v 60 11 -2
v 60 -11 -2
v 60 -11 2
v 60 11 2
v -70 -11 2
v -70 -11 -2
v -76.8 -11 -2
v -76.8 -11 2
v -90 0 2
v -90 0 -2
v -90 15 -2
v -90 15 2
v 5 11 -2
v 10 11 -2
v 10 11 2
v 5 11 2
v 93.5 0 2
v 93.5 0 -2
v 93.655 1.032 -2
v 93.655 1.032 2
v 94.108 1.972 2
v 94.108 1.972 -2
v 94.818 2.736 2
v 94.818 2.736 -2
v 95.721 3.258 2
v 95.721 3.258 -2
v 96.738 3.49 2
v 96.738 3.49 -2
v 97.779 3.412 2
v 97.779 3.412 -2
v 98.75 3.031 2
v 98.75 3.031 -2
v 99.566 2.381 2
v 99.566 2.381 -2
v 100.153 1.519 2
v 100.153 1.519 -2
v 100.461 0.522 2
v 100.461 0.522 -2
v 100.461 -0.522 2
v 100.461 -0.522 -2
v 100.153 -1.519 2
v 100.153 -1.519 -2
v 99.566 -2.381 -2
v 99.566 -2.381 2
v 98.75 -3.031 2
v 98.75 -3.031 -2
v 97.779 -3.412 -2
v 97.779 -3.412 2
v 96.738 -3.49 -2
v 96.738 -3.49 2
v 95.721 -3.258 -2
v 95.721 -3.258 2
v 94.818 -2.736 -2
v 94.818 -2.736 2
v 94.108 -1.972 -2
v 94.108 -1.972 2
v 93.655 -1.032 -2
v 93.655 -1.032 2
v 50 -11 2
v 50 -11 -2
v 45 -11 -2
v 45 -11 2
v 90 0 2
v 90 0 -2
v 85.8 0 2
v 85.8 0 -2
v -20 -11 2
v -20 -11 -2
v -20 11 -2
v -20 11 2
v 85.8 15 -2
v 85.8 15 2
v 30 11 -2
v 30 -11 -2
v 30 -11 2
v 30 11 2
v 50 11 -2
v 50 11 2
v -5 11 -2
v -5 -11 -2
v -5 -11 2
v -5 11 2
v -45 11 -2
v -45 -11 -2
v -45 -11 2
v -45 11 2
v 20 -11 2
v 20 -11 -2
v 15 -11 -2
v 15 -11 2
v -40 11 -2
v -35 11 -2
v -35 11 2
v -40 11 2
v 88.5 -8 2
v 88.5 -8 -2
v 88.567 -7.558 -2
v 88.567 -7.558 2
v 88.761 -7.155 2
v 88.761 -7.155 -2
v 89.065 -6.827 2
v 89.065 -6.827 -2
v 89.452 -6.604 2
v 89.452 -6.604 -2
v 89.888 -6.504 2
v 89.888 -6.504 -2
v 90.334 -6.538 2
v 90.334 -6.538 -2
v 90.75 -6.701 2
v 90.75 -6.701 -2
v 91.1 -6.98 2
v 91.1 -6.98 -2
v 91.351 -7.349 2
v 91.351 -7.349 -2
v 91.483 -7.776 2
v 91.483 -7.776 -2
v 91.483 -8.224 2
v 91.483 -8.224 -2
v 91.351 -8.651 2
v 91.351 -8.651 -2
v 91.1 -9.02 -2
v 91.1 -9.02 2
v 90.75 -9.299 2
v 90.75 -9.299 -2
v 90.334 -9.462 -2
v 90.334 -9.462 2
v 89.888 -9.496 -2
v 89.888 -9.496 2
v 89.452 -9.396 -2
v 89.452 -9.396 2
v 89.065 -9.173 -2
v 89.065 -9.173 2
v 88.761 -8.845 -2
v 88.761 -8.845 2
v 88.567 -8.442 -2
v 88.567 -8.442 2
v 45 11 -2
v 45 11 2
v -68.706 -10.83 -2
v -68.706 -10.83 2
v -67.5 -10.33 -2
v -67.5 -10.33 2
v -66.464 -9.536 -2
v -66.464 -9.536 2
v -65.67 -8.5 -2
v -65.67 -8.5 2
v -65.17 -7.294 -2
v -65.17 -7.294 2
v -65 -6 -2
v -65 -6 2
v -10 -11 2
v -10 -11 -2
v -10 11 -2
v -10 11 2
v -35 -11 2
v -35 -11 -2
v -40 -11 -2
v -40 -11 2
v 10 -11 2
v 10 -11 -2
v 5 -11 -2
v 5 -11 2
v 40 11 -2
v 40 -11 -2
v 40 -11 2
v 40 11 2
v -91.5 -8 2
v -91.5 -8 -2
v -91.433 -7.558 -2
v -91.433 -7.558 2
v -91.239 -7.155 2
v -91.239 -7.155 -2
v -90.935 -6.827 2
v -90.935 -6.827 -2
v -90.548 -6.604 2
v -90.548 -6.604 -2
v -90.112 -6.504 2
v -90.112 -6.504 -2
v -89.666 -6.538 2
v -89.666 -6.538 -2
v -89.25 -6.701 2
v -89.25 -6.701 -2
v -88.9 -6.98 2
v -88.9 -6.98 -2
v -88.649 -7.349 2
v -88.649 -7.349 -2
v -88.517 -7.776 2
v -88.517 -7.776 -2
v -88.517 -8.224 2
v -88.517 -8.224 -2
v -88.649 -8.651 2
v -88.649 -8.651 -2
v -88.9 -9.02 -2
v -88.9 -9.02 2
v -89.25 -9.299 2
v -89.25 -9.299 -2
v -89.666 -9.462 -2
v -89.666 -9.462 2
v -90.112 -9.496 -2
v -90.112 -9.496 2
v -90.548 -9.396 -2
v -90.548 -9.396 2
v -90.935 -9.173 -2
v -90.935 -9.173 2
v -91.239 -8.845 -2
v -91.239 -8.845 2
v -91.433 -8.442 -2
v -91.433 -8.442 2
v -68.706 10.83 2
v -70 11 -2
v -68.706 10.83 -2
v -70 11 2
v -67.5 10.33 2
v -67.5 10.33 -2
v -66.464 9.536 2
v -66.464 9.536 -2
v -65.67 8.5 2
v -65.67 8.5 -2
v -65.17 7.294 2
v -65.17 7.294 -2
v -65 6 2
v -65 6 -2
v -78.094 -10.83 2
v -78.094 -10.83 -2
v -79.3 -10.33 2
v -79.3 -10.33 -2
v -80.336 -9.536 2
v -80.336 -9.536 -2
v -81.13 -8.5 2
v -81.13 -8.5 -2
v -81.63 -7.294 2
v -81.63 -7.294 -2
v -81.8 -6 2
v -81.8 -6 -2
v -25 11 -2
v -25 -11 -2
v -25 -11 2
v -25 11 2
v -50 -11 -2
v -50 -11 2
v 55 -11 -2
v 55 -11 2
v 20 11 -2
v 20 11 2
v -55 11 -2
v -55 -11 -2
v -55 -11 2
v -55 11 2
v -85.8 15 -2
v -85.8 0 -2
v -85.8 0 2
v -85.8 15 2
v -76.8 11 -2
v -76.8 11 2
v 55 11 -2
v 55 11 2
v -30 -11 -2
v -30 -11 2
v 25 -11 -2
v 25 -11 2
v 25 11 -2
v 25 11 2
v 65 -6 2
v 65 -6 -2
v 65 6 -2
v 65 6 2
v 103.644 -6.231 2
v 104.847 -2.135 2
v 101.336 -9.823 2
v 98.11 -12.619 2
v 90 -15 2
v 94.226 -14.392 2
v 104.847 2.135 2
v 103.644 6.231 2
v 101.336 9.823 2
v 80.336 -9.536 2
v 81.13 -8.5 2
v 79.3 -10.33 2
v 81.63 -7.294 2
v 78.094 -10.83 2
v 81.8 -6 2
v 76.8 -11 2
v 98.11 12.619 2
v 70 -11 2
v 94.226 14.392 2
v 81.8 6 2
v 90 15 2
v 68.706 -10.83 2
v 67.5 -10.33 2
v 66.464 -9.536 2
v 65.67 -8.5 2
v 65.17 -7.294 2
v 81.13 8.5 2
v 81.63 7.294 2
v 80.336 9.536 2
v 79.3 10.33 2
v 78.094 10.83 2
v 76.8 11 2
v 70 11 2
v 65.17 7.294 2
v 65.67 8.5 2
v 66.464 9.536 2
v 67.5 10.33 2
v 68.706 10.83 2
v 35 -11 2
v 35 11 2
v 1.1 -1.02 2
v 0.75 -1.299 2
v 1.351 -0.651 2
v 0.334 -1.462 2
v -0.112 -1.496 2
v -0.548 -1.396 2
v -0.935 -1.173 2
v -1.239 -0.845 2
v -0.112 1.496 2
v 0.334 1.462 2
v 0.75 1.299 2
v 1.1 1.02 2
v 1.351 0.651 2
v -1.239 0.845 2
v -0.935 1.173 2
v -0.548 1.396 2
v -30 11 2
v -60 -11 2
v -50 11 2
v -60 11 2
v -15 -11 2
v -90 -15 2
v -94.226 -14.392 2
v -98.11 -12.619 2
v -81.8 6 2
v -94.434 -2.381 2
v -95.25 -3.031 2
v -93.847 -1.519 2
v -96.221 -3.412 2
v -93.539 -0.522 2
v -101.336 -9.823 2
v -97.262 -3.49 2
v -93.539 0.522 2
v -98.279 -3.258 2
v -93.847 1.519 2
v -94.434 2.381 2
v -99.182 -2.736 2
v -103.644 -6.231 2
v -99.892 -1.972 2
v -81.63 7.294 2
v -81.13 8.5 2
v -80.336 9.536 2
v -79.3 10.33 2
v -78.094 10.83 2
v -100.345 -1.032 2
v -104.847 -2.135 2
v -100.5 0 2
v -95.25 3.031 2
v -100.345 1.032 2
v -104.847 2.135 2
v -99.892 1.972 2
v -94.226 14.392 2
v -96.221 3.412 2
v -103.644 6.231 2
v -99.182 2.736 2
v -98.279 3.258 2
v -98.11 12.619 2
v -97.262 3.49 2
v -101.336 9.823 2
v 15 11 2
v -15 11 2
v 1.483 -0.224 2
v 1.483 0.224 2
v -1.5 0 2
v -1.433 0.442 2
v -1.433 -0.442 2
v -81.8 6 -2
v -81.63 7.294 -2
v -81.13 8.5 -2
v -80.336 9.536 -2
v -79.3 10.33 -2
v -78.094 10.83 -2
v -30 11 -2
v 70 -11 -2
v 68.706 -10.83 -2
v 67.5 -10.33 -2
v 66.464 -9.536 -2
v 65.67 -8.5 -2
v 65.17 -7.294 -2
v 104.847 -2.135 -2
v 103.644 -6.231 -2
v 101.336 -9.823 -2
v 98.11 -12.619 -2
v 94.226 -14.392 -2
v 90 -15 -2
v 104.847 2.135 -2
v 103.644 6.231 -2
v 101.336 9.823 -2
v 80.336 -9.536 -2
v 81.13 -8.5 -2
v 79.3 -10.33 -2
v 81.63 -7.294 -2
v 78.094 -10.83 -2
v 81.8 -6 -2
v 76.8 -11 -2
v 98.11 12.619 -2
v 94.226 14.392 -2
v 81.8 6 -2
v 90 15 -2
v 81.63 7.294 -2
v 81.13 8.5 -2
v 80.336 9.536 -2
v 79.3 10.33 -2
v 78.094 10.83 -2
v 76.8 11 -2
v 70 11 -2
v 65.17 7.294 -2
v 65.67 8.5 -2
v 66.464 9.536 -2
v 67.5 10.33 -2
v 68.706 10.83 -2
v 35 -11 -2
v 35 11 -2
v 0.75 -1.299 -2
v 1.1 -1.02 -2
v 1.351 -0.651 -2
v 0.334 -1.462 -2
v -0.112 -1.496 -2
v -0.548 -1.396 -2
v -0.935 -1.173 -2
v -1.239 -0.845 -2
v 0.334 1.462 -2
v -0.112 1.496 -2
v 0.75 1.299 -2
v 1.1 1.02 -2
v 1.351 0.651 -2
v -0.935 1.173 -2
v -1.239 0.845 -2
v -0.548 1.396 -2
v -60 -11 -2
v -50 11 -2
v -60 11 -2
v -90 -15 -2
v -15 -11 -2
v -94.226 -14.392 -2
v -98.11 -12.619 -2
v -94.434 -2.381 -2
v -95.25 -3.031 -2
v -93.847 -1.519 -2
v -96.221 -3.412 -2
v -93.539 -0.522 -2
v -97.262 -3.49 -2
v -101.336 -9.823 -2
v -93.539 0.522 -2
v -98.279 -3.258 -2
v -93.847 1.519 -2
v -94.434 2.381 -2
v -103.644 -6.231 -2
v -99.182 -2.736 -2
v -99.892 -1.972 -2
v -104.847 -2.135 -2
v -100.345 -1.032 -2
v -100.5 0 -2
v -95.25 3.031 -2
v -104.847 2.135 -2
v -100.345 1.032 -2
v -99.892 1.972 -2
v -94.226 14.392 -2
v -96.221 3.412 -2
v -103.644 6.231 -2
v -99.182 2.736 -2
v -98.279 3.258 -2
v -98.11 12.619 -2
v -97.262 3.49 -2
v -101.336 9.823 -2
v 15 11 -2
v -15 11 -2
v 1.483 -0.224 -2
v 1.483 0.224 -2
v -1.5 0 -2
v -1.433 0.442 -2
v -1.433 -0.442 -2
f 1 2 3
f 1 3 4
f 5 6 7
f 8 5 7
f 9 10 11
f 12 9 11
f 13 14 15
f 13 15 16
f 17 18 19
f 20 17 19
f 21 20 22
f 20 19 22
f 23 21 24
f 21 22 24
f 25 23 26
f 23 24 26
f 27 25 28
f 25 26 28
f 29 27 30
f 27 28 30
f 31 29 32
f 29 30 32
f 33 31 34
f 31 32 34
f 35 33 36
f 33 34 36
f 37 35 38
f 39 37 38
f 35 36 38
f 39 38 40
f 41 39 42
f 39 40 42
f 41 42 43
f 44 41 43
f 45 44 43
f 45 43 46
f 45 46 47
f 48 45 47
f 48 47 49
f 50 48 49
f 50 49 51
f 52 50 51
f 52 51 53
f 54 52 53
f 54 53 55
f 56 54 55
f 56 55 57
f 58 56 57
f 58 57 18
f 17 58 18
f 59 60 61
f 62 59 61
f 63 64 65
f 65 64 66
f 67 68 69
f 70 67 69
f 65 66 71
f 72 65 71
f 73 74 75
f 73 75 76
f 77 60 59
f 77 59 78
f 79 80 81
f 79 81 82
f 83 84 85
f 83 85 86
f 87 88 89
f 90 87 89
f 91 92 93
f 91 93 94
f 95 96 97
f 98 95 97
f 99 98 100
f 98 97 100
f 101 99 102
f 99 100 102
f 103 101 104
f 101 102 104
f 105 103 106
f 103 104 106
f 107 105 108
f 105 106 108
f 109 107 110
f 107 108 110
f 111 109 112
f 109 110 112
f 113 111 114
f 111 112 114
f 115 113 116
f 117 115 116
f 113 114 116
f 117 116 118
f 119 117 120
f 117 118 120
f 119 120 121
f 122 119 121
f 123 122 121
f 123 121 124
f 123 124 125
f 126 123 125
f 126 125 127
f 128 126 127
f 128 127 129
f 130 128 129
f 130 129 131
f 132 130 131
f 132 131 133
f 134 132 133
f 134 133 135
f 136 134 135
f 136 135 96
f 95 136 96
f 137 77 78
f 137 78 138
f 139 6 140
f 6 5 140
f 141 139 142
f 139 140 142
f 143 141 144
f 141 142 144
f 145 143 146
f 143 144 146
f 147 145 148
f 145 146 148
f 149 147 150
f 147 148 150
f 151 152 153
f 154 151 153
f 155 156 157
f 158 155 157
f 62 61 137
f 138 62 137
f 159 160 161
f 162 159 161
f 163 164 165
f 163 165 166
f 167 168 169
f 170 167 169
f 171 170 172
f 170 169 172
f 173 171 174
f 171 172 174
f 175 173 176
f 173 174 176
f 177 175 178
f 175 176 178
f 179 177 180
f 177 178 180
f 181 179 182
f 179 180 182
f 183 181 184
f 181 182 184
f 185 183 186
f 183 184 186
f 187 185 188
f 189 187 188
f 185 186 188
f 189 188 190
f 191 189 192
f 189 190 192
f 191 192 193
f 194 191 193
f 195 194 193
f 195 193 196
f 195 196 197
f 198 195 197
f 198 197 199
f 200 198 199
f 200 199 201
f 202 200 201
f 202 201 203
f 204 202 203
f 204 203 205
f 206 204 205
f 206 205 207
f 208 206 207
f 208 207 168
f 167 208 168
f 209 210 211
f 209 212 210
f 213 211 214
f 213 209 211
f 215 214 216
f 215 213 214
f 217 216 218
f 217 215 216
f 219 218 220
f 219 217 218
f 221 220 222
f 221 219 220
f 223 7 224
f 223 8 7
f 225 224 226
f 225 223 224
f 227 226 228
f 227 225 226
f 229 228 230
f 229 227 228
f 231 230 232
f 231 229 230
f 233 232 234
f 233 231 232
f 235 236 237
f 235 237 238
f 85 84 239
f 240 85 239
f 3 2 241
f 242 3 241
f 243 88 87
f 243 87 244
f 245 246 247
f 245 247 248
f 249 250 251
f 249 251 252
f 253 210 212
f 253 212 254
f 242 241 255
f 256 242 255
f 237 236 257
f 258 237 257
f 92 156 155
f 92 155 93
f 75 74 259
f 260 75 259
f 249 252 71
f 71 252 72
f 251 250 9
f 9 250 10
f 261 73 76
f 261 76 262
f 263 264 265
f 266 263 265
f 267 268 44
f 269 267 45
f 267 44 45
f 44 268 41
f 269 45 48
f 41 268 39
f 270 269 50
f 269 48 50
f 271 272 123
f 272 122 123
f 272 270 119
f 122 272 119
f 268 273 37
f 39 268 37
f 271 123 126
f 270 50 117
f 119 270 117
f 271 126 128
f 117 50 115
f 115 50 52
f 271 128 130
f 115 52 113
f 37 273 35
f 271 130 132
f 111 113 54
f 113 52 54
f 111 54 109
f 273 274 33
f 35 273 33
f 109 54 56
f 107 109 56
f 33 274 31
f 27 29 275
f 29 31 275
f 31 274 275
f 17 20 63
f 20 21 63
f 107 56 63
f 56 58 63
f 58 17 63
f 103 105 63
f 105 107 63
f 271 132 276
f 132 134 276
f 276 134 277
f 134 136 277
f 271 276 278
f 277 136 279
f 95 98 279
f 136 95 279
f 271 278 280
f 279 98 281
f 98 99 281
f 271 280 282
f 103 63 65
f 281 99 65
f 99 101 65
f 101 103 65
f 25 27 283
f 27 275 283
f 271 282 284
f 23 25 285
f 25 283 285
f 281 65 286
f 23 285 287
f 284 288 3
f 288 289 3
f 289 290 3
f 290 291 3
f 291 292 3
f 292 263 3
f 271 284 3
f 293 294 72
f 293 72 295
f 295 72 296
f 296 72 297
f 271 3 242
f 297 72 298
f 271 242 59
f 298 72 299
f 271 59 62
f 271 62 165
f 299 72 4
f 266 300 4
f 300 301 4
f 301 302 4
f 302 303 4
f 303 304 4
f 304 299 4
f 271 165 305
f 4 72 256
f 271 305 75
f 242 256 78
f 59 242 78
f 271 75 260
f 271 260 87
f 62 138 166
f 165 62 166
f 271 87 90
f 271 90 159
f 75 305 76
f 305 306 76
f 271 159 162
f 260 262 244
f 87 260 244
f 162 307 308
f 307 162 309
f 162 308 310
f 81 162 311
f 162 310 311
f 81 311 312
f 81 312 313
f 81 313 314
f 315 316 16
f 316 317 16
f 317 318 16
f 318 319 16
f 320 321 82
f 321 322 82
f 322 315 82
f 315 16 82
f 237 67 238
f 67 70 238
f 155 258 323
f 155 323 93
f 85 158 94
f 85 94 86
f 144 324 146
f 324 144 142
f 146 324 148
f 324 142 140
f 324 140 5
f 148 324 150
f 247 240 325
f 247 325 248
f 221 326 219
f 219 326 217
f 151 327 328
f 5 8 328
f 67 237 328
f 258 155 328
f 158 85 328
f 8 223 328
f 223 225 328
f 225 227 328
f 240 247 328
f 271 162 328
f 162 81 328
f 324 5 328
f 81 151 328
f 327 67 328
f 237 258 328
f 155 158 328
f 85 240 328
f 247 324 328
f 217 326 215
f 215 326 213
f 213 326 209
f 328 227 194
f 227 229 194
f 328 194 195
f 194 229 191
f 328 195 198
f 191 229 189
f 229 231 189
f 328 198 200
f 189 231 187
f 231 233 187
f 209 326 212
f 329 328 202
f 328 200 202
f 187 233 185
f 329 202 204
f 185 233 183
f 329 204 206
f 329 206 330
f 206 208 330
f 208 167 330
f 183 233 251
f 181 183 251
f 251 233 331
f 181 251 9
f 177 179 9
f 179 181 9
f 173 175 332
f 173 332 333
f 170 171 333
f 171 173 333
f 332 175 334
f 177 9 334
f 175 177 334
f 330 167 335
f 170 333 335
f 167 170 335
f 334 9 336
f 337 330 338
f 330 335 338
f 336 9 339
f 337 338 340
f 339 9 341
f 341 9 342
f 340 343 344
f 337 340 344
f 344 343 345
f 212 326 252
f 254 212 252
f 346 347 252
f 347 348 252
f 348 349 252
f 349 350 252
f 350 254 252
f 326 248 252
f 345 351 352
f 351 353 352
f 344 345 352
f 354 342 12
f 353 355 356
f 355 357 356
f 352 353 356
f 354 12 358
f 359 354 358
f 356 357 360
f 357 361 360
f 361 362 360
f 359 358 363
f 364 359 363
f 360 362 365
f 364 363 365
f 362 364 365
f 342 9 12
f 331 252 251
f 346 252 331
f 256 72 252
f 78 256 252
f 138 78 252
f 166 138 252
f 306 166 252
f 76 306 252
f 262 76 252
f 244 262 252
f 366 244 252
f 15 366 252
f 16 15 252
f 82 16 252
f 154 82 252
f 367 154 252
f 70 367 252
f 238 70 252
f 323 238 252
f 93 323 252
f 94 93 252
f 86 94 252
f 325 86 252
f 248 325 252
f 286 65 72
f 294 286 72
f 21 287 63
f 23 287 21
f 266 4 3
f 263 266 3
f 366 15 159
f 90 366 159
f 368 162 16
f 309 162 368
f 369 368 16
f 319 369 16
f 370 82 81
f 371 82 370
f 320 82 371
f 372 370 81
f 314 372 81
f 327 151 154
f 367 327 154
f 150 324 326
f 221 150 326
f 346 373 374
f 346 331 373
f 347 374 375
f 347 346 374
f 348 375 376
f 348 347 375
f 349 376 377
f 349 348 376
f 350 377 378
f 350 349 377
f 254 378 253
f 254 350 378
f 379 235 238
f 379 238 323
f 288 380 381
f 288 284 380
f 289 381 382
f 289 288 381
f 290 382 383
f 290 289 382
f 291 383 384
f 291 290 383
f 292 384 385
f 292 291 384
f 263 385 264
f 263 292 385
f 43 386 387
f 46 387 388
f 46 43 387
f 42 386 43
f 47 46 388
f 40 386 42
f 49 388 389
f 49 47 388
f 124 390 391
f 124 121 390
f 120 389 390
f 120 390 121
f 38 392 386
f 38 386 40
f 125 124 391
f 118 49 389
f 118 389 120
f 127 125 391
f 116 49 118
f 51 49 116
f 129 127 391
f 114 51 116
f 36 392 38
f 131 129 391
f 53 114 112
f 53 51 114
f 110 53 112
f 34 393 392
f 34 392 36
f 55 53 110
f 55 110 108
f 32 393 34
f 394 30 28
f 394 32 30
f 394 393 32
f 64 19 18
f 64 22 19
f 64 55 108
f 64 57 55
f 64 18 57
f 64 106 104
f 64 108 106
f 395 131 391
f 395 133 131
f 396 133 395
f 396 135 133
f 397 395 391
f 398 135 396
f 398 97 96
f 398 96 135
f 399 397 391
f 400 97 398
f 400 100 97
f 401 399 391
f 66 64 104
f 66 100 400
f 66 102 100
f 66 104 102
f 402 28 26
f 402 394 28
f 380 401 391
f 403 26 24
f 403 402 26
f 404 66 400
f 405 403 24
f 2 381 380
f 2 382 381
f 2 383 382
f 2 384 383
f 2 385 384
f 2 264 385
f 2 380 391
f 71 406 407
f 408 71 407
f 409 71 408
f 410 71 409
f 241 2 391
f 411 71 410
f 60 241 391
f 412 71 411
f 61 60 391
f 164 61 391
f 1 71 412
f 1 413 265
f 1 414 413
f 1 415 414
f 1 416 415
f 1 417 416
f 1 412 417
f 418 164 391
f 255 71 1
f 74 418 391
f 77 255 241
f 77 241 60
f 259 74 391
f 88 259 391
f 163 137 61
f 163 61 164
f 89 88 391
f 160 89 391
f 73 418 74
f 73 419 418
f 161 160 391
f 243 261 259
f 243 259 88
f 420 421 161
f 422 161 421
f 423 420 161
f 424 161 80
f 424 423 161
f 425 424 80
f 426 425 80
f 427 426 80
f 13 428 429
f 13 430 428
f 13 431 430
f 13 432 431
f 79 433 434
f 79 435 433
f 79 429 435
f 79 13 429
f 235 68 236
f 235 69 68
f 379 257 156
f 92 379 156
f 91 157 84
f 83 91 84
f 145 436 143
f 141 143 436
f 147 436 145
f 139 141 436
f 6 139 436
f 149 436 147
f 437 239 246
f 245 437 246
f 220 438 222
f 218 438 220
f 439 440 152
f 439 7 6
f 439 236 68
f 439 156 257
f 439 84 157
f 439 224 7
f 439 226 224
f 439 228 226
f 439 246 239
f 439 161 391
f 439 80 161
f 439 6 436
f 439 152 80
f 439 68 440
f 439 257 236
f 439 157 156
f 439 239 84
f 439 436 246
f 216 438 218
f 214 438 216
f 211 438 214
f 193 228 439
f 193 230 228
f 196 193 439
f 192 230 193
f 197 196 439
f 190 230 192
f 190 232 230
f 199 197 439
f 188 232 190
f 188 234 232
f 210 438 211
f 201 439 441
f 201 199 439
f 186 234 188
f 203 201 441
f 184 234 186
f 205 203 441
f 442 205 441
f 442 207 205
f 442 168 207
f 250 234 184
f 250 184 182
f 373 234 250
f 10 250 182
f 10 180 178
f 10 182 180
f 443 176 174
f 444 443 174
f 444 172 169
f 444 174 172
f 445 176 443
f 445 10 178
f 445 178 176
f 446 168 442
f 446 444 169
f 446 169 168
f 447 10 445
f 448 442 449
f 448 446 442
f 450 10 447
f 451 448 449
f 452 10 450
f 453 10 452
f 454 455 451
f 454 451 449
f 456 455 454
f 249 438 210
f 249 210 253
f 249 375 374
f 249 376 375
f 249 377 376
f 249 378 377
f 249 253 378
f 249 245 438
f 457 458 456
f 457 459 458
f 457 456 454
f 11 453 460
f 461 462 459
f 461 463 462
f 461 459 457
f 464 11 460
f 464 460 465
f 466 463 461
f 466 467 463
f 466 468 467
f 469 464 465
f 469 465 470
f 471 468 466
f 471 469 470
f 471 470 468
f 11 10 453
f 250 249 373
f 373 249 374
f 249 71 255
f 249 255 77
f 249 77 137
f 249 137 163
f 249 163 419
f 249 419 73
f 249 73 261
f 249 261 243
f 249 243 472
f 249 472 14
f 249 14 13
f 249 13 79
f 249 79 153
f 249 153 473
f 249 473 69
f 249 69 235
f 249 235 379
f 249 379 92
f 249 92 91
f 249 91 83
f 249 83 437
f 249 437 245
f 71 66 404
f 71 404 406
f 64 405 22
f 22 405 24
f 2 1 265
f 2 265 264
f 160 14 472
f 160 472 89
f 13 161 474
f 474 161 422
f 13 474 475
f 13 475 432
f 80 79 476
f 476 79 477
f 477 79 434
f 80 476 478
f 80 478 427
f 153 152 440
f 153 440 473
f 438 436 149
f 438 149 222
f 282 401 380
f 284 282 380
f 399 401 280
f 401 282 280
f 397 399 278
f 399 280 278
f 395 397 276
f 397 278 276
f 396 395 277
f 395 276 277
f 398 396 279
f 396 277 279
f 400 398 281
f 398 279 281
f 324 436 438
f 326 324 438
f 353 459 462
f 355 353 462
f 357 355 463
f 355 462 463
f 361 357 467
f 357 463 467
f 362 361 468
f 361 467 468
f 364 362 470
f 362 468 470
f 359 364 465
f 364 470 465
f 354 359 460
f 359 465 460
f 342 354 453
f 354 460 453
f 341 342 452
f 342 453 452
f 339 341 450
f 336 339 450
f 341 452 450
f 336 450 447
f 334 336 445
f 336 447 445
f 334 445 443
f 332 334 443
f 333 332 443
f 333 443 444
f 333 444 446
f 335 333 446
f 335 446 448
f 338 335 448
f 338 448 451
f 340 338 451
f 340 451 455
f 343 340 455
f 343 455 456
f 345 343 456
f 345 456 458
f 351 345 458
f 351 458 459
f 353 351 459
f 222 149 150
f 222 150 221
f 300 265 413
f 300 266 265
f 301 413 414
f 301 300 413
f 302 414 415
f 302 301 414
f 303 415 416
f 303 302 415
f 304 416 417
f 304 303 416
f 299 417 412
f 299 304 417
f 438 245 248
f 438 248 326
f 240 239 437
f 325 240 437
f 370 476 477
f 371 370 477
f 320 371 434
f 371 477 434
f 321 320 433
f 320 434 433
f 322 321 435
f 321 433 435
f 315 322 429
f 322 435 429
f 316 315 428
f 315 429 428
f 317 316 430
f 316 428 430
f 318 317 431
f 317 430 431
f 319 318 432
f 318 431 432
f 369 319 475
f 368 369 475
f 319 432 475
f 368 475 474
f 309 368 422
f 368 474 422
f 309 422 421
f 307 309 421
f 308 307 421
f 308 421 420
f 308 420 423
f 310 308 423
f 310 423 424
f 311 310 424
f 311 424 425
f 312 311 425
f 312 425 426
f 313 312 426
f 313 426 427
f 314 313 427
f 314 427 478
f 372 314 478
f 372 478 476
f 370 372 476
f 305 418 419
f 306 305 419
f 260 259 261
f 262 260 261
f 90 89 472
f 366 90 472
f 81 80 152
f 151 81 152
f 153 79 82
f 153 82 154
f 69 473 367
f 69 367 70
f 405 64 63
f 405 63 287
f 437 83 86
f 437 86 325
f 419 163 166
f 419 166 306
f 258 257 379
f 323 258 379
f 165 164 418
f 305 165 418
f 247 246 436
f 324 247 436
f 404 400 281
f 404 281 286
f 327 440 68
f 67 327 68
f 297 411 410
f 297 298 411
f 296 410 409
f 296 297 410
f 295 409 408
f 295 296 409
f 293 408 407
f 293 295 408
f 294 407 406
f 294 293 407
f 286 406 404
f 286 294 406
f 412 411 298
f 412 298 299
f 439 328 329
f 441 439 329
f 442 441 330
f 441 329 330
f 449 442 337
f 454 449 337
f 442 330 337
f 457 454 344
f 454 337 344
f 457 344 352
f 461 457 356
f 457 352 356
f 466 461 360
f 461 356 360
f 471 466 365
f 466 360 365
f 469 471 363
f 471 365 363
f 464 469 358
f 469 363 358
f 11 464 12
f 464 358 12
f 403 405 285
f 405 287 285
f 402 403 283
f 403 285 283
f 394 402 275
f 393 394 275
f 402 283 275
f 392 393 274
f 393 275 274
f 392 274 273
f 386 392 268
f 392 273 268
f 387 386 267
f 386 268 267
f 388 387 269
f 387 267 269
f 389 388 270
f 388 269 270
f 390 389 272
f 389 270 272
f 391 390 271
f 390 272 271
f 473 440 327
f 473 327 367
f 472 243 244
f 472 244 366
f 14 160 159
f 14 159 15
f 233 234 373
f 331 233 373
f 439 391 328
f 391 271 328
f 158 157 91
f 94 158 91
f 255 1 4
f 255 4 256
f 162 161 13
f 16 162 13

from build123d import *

# Parameters (mm, degrees)
EXTRUDE_1_DEPTH     = 2
SKETCH_11_W         = 4.2
SKETCH_11_H         = 15
SKETCH_11_W_2       = 16.8
SKETCH_11_H_2       = 22
SKETCH_11_W_3       = 5
SKETCH_11_R         = 3.5
SKETCH_11_R_2       = 1.5
CUT_EXTRUDE_1_DEPTH = 10
FILLET_1_R          = 5


with BuildPart() as part:
    # Эскиз1 → Бобышка-Вытянуть1 (new, symmetric)
    with BuildSketch(Plane.XY):
        with BuildLine():
            Line((-90, 15), (90, 15))
            ThreePointArc((90, 15), (105, 0), (90, -15))
            Line((90, -15), (-90, -15))
            ThreePointArc((-90, -15), (-105, 0), (-90, 15))
        make_face()
    extrude(amount=EXTRUDE_1_DEPTH, both=True)

    # Эскиз11 → Вырез-Вытянуть1 (cut)
    with BuildSketch(Plane(origin=(0, 0, -2), x_dir=(-1, 0, 0), z_dir=(0, 0, -1))):
        with Locations((-87.9, 7.5)):
            Rectangle(SKETCH_11_W, SKETCH_11_H)
        with Locations((-73.4, 0)):
            Rectangle(SKETCH_11_W_2, SKETCH_11_H_2)
        with Locations((-57.5, 0)):
            Rectangle(SKETCH_11_W_3, SKETCH_11_H_2)
        with Locations((-47.5, 0)):
            Rectangle(SKETCH_11_W_3, SKETCH_11_H_2)
        with Locations((-37.5, 0)):
            Rectangle(SKETCH_11_W_3, SKETCH_11_H_2)
        with Locations((-27.5, 0)):
            Rectangle(SKETCH_11_W_3, SKETCH_11_H_2)
        with Locations((-17.5, 0)):
            Rectangle(SKETCH_11_W_3, SKETCH_11_H_2)
        with Locations((-7.5, 0)):
            Rectangle(SKETCH_11_W_3, SKETCH_11_H_2)
        with Locations((7.5, 0)):
            Rectangle(SKETCH_11_W_3, SKETCH_11_H_2)
        with Locations((17.5, 0)):
            Rectangle(SKETCH_11_W_3, SKETCH_11_H_2)
        with Locations((27.5, 0)):
            Rectangle(SKETCH_11_W_3, SKETCH_11_H_2)
        with Locations((37.5, 0)):
            Rectangle(SKETCH_11_W_3, SKETCH_11_H_2)
        with Locations((47.5, 0)):
            Rectangle(SKETCH_11_W_3, SKETCH_11_H_2)
        with Locations((57.5, 0)):
            Rectangle(SKETCH_11_W_3, SKETCH_11_H_2)
        with Locations((73.4, 0)):
            Rectangle(SKETCH_11_W_2, SKETCH_11_H_2)
        with Locations((87.9, 7.5)):
            Rectangle(SKETCH_11_W, SKETCH_11_H)
        with Locations((97, 0)):
            Circle(SKETCH_11_R)
        with Locations((-97, 0)):
            Circle(SKETCH_11_R)
        Circle(SKETCH_11_R_2)
        with Locations((-90, -8)):
            Circle(SKETCH_11_R_2)
        with Locations((90, -8)):
            Circle(SKETCH_11_R_2)
    extrude(amount=-CUT_EXTRUDE_1_DEPTH, mode=Mode.SUBTRACT)

    # Скругление1
    fillet_1_edges = [part.edges().sort_by_distance(p)[0] for p in [
        (-65, 11, 0),
        (-81.8, 11, 0),
        (-81.8, -11, 0),
        (-65, -11, 0),
        (65, 11, 0),
        (65, -11, 0),
        (81.8, -11, 0),
        (81.8, 11, 0),
    ]]
    fillet(fillet_1_edges, radius=FILLET_1_R)


solid = part.part
